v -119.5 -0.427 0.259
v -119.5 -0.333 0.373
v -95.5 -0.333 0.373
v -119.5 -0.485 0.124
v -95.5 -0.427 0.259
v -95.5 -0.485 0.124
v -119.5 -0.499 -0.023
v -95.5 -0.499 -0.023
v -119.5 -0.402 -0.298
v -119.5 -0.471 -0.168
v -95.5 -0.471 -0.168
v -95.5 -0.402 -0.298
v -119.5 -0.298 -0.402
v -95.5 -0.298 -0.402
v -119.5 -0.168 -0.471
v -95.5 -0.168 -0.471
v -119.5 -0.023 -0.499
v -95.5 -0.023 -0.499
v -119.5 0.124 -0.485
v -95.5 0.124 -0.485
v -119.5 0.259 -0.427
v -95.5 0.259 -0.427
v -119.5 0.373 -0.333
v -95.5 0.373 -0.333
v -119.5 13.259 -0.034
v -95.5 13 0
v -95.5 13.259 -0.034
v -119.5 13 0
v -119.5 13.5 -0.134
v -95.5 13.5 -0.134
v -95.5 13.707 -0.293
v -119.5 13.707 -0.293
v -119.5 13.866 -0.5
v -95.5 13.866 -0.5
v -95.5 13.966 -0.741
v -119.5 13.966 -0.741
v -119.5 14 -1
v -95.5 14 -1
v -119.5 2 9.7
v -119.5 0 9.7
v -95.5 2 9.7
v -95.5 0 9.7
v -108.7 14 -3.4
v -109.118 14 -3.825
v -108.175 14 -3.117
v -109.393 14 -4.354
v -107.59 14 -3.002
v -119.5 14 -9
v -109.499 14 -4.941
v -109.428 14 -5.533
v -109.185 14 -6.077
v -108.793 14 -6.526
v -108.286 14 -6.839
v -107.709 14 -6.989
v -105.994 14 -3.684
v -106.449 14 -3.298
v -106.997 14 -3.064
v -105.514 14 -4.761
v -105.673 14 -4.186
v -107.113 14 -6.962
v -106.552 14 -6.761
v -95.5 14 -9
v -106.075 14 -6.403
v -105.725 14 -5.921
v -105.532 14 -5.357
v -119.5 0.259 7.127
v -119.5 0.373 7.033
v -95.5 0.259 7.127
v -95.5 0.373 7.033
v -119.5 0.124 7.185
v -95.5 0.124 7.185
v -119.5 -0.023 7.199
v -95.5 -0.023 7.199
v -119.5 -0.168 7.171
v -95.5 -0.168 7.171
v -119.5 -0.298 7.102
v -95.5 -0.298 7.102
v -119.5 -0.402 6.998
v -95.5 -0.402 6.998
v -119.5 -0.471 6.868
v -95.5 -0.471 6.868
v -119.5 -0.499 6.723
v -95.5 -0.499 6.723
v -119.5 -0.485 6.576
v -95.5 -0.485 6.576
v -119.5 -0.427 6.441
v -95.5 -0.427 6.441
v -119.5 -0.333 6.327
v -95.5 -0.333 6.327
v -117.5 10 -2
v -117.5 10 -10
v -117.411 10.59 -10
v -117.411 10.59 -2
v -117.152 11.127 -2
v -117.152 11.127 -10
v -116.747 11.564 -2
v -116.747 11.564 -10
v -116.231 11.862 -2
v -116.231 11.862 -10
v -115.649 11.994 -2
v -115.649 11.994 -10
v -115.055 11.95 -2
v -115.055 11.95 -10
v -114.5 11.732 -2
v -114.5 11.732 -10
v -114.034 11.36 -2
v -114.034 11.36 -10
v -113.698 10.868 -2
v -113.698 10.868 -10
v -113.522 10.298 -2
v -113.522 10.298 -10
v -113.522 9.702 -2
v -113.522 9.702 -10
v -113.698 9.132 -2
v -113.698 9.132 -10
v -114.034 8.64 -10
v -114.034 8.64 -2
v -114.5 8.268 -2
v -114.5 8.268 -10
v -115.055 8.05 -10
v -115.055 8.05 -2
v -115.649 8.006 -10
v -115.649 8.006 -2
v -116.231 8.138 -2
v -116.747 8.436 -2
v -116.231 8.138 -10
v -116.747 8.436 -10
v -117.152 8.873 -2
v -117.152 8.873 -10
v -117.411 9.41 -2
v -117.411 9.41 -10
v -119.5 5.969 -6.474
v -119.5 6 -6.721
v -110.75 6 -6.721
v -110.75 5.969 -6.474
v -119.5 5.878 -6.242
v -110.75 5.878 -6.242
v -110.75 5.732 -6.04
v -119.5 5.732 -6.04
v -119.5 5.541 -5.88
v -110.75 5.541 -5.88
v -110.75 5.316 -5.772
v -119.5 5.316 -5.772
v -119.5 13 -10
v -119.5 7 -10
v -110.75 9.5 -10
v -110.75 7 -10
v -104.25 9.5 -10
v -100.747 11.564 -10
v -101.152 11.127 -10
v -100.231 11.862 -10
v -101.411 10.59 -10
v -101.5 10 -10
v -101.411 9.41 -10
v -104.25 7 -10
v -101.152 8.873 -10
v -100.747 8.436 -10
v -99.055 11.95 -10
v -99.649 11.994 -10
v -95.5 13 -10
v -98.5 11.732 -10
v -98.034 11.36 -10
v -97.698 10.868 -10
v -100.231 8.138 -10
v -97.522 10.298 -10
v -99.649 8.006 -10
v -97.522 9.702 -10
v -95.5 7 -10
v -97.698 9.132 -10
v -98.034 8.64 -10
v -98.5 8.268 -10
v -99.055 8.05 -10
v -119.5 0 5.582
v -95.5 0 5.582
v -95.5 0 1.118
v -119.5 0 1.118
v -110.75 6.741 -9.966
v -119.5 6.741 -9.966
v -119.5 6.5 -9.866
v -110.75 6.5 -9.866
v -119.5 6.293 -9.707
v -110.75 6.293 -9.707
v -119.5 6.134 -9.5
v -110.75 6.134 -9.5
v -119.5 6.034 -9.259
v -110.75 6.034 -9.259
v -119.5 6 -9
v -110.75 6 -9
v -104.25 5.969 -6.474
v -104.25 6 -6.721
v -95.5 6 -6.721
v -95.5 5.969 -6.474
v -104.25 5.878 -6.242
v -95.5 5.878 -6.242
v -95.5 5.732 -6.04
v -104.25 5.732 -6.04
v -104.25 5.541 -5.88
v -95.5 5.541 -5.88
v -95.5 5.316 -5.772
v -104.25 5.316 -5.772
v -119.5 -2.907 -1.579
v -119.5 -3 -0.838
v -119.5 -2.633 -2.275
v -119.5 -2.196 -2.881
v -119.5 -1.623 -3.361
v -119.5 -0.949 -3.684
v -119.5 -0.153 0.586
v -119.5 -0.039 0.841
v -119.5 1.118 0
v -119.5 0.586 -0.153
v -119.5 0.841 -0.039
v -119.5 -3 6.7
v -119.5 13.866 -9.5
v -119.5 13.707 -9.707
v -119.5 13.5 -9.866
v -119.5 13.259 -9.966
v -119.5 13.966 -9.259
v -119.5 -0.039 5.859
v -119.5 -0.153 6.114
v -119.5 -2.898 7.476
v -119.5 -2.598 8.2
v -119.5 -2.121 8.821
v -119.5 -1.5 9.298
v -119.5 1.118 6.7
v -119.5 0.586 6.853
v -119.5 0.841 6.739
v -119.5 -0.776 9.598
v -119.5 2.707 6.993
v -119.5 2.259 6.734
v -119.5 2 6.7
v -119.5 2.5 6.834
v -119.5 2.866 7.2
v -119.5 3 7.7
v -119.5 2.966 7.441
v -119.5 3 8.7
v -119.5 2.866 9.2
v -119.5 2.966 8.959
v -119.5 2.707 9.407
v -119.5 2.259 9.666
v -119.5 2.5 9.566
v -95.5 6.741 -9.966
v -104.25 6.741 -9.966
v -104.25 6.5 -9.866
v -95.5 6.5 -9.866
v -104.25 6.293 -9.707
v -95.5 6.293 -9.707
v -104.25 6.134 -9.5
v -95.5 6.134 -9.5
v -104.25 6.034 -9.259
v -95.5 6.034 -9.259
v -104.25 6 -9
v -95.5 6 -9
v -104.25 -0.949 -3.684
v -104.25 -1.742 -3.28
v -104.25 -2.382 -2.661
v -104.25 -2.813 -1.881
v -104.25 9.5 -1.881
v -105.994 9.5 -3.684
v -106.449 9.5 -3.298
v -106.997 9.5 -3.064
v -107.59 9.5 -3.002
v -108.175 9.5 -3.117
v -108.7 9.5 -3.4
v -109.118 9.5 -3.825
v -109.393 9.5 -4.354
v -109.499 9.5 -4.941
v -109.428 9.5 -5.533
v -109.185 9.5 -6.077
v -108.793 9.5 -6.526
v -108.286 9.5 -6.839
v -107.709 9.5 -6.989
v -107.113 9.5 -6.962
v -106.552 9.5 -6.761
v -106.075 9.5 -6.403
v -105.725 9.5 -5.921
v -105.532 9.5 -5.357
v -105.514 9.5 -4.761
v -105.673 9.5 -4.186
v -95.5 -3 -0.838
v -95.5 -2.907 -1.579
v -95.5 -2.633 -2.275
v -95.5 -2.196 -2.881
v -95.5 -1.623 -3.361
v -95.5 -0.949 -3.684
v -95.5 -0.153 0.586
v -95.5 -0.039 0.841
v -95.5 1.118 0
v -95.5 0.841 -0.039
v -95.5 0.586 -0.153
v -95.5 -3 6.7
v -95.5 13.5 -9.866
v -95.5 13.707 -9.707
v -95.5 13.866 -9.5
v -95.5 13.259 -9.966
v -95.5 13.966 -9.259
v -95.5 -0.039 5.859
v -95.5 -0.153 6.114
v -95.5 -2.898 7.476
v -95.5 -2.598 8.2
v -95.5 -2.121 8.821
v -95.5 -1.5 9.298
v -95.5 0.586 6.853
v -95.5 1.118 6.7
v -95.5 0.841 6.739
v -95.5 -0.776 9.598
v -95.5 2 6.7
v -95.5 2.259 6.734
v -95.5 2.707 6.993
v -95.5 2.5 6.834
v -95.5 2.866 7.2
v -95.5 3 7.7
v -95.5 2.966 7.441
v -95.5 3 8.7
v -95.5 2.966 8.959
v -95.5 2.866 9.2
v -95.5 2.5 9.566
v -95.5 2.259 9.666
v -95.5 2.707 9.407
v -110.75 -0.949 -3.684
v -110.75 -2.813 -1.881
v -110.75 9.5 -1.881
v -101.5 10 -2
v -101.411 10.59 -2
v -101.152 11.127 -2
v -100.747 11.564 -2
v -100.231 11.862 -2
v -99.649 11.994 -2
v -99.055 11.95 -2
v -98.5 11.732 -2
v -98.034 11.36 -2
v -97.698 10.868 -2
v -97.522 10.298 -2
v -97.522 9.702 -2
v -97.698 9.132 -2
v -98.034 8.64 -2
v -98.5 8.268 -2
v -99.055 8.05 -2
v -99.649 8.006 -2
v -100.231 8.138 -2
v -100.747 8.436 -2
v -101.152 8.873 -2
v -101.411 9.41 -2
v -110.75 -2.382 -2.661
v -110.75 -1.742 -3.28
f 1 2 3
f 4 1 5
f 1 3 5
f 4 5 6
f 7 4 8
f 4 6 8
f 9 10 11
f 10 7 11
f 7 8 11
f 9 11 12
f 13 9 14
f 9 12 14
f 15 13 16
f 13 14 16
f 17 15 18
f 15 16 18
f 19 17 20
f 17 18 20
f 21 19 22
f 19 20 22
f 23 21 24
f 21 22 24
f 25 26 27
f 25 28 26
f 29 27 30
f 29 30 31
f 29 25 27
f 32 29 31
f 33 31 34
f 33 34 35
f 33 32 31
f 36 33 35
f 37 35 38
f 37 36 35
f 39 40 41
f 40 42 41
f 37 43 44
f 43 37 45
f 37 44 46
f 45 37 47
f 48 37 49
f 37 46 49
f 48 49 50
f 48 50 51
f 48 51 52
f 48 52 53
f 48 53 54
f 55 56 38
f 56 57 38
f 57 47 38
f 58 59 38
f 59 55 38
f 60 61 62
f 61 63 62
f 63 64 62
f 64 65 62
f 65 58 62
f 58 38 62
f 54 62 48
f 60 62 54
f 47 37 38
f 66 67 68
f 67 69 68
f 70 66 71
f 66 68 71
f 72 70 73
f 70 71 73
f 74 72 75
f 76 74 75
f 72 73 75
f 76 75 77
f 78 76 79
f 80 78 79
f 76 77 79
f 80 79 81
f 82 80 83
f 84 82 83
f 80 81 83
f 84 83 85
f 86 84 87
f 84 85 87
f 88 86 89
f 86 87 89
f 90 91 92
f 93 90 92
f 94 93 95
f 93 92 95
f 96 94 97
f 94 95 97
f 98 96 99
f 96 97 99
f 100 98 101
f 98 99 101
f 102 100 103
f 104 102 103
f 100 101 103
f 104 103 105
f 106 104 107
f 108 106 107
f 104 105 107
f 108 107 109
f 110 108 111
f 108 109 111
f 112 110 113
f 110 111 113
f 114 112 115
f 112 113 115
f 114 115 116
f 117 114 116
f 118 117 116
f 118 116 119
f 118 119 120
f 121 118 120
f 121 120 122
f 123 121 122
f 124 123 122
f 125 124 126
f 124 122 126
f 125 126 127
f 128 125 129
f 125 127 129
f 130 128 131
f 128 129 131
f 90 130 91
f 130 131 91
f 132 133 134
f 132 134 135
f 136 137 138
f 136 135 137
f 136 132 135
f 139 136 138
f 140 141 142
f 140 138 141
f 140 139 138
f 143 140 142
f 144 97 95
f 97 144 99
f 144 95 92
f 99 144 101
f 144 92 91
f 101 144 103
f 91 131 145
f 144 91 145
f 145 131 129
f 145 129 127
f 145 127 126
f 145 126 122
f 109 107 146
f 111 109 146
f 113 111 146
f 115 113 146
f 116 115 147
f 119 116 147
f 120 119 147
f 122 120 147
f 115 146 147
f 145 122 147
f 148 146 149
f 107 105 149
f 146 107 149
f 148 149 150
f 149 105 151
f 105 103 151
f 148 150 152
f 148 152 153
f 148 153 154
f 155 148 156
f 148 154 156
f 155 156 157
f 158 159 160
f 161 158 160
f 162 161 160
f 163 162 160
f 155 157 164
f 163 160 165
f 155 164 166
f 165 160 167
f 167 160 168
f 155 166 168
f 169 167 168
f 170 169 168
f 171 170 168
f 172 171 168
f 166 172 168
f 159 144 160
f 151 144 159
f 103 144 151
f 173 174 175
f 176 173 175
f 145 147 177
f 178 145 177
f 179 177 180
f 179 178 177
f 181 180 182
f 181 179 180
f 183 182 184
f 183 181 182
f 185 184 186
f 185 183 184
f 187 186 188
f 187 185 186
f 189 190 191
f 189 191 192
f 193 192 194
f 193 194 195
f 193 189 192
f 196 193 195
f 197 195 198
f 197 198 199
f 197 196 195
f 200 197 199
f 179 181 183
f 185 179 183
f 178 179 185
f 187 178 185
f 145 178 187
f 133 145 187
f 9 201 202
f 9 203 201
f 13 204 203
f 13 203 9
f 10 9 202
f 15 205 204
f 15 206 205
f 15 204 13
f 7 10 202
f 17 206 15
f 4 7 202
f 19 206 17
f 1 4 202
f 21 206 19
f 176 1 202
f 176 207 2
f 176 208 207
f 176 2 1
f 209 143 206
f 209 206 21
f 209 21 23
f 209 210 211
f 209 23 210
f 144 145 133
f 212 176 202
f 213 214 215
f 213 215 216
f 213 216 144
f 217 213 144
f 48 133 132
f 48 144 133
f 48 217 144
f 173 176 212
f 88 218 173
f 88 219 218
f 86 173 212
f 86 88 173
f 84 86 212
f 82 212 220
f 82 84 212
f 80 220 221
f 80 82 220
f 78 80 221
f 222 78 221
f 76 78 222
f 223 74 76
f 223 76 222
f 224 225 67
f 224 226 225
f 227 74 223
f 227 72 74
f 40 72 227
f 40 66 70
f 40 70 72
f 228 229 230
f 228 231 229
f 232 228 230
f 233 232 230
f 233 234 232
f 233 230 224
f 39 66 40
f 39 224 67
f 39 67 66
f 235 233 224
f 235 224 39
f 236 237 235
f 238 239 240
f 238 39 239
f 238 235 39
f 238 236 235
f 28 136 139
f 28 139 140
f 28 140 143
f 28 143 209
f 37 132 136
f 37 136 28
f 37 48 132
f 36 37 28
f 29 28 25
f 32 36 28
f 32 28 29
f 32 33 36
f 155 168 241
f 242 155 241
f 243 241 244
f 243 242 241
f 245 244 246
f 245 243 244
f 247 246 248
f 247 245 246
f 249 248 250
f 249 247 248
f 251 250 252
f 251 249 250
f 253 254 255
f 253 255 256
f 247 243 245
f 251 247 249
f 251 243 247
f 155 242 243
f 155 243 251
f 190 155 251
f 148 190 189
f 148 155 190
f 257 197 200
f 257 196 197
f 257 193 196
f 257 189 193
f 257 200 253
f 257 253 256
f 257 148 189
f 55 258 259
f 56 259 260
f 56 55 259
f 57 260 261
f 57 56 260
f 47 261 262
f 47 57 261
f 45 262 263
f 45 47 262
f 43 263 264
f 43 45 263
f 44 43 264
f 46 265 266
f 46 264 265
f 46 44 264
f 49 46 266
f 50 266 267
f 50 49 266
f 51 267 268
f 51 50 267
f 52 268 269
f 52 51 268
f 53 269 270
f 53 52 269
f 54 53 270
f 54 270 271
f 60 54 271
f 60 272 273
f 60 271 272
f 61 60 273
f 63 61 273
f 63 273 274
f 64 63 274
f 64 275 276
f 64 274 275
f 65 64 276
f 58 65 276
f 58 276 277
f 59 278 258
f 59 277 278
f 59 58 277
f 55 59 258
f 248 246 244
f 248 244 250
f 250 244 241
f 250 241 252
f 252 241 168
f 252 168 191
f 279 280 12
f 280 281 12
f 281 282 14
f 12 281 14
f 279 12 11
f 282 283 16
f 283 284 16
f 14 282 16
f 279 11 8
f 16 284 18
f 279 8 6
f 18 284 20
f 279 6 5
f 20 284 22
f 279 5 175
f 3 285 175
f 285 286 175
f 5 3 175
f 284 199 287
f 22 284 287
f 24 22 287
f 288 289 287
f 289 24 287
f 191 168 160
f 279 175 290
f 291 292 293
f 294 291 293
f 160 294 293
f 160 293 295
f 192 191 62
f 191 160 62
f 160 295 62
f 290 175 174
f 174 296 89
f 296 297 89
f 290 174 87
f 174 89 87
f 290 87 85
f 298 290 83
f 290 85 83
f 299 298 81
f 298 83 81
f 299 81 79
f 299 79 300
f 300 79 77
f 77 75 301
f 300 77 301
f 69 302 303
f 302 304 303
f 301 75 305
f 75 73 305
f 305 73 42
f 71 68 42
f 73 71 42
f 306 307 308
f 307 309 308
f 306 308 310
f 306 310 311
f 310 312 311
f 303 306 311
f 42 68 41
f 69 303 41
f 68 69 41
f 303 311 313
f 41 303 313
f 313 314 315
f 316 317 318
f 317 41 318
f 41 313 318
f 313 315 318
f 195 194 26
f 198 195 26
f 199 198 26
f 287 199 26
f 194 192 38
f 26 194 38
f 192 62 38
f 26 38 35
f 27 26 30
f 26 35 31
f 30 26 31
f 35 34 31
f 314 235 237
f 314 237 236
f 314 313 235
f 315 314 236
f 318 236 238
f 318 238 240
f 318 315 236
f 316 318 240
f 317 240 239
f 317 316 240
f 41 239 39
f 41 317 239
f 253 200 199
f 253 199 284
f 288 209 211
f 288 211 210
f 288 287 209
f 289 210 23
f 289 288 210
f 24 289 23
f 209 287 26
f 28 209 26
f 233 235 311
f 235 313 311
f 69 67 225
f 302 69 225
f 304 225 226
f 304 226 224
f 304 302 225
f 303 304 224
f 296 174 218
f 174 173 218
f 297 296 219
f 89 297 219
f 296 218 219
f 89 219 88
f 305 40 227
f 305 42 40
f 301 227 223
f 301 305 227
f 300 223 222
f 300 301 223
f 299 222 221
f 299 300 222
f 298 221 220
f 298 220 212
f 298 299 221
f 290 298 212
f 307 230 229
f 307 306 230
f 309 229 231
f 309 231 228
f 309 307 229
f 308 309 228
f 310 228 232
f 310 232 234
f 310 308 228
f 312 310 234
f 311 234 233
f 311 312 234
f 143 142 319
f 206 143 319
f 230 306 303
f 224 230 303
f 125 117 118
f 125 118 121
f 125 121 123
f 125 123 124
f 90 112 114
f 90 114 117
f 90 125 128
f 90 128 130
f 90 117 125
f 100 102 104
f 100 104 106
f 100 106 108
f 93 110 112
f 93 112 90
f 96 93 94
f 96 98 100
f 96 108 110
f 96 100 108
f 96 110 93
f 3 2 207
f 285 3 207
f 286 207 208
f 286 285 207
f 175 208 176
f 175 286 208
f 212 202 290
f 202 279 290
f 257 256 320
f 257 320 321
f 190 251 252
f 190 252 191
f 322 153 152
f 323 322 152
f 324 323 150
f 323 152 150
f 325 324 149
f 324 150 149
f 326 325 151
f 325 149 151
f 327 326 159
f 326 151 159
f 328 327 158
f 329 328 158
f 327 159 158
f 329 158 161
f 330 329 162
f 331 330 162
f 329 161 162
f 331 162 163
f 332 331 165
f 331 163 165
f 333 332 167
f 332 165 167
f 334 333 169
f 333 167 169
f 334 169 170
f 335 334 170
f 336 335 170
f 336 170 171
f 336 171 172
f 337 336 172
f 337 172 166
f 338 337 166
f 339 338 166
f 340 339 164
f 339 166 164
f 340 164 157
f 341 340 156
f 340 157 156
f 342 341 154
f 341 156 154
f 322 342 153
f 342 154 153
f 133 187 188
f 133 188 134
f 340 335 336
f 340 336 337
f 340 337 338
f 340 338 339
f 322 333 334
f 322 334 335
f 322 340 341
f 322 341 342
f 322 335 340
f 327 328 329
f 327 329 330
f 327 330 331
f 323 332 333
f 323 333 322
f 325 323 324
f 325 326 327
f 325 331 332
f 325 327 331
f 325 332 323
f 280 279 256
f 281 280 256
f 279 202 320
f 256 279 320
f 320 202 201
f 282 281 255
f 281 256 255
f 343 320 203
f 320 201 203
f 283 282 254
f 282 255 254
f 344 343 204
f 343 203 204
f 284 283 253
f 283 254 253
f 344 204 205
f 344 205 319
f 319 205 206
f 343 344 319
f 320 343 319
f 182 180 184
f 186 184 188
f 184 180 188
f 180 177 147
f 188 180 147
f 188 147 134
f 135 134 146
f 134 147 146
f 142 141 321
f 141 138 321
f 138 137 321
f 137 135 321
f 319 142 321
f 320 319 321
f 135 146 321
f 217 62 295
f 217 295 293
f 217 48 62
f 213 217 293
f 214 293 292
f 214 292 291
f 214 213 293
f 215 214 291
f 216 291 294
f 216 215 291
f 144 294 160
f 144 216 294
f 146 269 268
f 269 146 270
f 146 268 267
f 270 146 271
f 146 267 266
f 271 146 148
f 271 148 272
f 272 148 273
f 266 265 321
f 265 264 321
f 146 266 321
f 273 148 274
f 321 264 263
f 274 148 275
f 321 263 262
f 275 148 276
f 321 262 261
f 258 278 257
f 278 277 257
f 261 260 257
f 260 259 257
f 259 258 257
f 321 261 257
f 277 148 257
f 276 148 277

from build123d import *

# Parameters (mm, degrees)
BOSS_EXTRUDE1_DEPTH = 12
FILLET1_R           = 3
SKETCH4_R           = 0.5
CUT_EXTRUDE3_DEPTH  = 121.732141537
FILLET2_R           = 1
FILLET3_R           = 1
FILLET4_R           = 1
FILLET6_R           = 1
SKETCH2_R           = 2
CUT_EXTRUDE1_DEPTH  = 122.116679281
SKETCH6_R           = 2
CUT_EXTRUDE4_DEPTH  = 8
CUT_EXTRUDE5_DEPTH  = 3.25


with BuildPart() as part:
    # Sketch1 → Boss-Extrude1 (new, symmetric)
    with BuildSketch(Plane(origin=(-107.5, 40, 0), x_dir=(0, 0, -1), z_dir=(1, 0, 0))):
        Polygon((-6.7, -37), (-6.7, -40), (0, -40), (0, -26), (10, -26), (10, -34), (6, -34), (3, -43), (-9.7, -43), (-9.7, -37), align=None)
    extrude(amount=BOSS_EXTRUDE1_DEPTH, both=True)

    # Fillet1
    fillet1_edges = [part.edges().sort_by_distance(p)[0] for p in [
        (-107.5, -3, -3),
        (-107.5, -3, 9.7),
    ]]
    fillet(fillet1_edges, radius=FILLET1_R)

    # Sketch4 → Cut-Extrude3 (cut, through all)
    with BuildSketch(Plane(origin=(0, 0, 0), x_dir=(0, 0, -1), z_dir=(1, 0, 0))):
        with Locations((-6.7, 0)):
            Circle(SKETCH4_R)
        Circle(SKETCH4_R)
    extrude(amount=-CUT_EXTRUDE3_DEPTH, mode=Mode.SUBTRACT)

    # Fillet2
    fillet2_edges = [part.edges().sort_by_distance(p)[0] for p in [
        (-107.5, 0, 6.2),
        (-107.5, 0.5, 6.7),
        (-107.5, 0.5, 0),
        (-107.5, 0, 0.5),
    ]]
    fillet(fillet2_edges, radius=FILLET2_R)

    # Fillet3
    fillet3_edges = [part.edges().sort_by_distance(p)[0] for p in [
        (-107.5, 3, 6.7),
        (-107.5, 3, 9.7),
    ]]
    fillet(fillet3_edges, radius=FILLET3_R)

    # Fillet4
    fillet4_edges = [part.edges().sort_by_distance(p)[0] for p in [
        (-107.5, 14, 0),
        (-107.5, 14, -10),
    ]]
    fillet(fillet4_edges, radius=FILLET4_R)

    # Fillet6
    fillet6_edges = [part.edges().sort_by_distance(p)[0] for p in [
        (-107.5, 6, -10),
        (-107.5, 6, -6),
    ]]
    fillet(fillet6_edges, radius=FILLET6_R)

    # Sketch2 → Cut-Extrude1 (cut, through all)
    with BuildSketch(Plane.XZ.offset(-14)):
        with Locations(Location((-107.5, -5, 0), (0, 0, 41.156184936))):
            Circle(SKETCH2_R)
    extrude(amount=CUT_EXTRUDE1_DEPTH, mode=Mode.SUBTRACT)

    # Sketch6 → Cut-Extrude4 (cut)
    with BuildSketch(Plane(origin=(0, 0, -10), x_dir=(-1, 0, 0), z_dir=(0, 0, -1))):
        with Locations((115.5, 10)):
            Circle(SKETCH6_R)
        with Locations((99.5, 10)):
            Circle(SKETCH6_R)
    extrude(amount=-CUT_EXTRUDE4_DEPTH, mode=Mode.SUBTRACT)

    # Sketch7 → Cut-Extrude5 (cut, symmetric)
    with BuildSketch(Plane(origin=(-107.5, 40, 0), x_dir=(0, 0, -1), z_dir=(1, 0, 0))):
        Polygon((1.88130822, -30.5), (8.38130822, -30.5), (10, -30.5), (10, -43), (8.38130822, -43), (1.88130822, -43), align=None)
    extrude(amount=CUT_EXTRUDE5_DEPTH, both=True, mode=Mode.SUBTRACT)


solid = part.part
